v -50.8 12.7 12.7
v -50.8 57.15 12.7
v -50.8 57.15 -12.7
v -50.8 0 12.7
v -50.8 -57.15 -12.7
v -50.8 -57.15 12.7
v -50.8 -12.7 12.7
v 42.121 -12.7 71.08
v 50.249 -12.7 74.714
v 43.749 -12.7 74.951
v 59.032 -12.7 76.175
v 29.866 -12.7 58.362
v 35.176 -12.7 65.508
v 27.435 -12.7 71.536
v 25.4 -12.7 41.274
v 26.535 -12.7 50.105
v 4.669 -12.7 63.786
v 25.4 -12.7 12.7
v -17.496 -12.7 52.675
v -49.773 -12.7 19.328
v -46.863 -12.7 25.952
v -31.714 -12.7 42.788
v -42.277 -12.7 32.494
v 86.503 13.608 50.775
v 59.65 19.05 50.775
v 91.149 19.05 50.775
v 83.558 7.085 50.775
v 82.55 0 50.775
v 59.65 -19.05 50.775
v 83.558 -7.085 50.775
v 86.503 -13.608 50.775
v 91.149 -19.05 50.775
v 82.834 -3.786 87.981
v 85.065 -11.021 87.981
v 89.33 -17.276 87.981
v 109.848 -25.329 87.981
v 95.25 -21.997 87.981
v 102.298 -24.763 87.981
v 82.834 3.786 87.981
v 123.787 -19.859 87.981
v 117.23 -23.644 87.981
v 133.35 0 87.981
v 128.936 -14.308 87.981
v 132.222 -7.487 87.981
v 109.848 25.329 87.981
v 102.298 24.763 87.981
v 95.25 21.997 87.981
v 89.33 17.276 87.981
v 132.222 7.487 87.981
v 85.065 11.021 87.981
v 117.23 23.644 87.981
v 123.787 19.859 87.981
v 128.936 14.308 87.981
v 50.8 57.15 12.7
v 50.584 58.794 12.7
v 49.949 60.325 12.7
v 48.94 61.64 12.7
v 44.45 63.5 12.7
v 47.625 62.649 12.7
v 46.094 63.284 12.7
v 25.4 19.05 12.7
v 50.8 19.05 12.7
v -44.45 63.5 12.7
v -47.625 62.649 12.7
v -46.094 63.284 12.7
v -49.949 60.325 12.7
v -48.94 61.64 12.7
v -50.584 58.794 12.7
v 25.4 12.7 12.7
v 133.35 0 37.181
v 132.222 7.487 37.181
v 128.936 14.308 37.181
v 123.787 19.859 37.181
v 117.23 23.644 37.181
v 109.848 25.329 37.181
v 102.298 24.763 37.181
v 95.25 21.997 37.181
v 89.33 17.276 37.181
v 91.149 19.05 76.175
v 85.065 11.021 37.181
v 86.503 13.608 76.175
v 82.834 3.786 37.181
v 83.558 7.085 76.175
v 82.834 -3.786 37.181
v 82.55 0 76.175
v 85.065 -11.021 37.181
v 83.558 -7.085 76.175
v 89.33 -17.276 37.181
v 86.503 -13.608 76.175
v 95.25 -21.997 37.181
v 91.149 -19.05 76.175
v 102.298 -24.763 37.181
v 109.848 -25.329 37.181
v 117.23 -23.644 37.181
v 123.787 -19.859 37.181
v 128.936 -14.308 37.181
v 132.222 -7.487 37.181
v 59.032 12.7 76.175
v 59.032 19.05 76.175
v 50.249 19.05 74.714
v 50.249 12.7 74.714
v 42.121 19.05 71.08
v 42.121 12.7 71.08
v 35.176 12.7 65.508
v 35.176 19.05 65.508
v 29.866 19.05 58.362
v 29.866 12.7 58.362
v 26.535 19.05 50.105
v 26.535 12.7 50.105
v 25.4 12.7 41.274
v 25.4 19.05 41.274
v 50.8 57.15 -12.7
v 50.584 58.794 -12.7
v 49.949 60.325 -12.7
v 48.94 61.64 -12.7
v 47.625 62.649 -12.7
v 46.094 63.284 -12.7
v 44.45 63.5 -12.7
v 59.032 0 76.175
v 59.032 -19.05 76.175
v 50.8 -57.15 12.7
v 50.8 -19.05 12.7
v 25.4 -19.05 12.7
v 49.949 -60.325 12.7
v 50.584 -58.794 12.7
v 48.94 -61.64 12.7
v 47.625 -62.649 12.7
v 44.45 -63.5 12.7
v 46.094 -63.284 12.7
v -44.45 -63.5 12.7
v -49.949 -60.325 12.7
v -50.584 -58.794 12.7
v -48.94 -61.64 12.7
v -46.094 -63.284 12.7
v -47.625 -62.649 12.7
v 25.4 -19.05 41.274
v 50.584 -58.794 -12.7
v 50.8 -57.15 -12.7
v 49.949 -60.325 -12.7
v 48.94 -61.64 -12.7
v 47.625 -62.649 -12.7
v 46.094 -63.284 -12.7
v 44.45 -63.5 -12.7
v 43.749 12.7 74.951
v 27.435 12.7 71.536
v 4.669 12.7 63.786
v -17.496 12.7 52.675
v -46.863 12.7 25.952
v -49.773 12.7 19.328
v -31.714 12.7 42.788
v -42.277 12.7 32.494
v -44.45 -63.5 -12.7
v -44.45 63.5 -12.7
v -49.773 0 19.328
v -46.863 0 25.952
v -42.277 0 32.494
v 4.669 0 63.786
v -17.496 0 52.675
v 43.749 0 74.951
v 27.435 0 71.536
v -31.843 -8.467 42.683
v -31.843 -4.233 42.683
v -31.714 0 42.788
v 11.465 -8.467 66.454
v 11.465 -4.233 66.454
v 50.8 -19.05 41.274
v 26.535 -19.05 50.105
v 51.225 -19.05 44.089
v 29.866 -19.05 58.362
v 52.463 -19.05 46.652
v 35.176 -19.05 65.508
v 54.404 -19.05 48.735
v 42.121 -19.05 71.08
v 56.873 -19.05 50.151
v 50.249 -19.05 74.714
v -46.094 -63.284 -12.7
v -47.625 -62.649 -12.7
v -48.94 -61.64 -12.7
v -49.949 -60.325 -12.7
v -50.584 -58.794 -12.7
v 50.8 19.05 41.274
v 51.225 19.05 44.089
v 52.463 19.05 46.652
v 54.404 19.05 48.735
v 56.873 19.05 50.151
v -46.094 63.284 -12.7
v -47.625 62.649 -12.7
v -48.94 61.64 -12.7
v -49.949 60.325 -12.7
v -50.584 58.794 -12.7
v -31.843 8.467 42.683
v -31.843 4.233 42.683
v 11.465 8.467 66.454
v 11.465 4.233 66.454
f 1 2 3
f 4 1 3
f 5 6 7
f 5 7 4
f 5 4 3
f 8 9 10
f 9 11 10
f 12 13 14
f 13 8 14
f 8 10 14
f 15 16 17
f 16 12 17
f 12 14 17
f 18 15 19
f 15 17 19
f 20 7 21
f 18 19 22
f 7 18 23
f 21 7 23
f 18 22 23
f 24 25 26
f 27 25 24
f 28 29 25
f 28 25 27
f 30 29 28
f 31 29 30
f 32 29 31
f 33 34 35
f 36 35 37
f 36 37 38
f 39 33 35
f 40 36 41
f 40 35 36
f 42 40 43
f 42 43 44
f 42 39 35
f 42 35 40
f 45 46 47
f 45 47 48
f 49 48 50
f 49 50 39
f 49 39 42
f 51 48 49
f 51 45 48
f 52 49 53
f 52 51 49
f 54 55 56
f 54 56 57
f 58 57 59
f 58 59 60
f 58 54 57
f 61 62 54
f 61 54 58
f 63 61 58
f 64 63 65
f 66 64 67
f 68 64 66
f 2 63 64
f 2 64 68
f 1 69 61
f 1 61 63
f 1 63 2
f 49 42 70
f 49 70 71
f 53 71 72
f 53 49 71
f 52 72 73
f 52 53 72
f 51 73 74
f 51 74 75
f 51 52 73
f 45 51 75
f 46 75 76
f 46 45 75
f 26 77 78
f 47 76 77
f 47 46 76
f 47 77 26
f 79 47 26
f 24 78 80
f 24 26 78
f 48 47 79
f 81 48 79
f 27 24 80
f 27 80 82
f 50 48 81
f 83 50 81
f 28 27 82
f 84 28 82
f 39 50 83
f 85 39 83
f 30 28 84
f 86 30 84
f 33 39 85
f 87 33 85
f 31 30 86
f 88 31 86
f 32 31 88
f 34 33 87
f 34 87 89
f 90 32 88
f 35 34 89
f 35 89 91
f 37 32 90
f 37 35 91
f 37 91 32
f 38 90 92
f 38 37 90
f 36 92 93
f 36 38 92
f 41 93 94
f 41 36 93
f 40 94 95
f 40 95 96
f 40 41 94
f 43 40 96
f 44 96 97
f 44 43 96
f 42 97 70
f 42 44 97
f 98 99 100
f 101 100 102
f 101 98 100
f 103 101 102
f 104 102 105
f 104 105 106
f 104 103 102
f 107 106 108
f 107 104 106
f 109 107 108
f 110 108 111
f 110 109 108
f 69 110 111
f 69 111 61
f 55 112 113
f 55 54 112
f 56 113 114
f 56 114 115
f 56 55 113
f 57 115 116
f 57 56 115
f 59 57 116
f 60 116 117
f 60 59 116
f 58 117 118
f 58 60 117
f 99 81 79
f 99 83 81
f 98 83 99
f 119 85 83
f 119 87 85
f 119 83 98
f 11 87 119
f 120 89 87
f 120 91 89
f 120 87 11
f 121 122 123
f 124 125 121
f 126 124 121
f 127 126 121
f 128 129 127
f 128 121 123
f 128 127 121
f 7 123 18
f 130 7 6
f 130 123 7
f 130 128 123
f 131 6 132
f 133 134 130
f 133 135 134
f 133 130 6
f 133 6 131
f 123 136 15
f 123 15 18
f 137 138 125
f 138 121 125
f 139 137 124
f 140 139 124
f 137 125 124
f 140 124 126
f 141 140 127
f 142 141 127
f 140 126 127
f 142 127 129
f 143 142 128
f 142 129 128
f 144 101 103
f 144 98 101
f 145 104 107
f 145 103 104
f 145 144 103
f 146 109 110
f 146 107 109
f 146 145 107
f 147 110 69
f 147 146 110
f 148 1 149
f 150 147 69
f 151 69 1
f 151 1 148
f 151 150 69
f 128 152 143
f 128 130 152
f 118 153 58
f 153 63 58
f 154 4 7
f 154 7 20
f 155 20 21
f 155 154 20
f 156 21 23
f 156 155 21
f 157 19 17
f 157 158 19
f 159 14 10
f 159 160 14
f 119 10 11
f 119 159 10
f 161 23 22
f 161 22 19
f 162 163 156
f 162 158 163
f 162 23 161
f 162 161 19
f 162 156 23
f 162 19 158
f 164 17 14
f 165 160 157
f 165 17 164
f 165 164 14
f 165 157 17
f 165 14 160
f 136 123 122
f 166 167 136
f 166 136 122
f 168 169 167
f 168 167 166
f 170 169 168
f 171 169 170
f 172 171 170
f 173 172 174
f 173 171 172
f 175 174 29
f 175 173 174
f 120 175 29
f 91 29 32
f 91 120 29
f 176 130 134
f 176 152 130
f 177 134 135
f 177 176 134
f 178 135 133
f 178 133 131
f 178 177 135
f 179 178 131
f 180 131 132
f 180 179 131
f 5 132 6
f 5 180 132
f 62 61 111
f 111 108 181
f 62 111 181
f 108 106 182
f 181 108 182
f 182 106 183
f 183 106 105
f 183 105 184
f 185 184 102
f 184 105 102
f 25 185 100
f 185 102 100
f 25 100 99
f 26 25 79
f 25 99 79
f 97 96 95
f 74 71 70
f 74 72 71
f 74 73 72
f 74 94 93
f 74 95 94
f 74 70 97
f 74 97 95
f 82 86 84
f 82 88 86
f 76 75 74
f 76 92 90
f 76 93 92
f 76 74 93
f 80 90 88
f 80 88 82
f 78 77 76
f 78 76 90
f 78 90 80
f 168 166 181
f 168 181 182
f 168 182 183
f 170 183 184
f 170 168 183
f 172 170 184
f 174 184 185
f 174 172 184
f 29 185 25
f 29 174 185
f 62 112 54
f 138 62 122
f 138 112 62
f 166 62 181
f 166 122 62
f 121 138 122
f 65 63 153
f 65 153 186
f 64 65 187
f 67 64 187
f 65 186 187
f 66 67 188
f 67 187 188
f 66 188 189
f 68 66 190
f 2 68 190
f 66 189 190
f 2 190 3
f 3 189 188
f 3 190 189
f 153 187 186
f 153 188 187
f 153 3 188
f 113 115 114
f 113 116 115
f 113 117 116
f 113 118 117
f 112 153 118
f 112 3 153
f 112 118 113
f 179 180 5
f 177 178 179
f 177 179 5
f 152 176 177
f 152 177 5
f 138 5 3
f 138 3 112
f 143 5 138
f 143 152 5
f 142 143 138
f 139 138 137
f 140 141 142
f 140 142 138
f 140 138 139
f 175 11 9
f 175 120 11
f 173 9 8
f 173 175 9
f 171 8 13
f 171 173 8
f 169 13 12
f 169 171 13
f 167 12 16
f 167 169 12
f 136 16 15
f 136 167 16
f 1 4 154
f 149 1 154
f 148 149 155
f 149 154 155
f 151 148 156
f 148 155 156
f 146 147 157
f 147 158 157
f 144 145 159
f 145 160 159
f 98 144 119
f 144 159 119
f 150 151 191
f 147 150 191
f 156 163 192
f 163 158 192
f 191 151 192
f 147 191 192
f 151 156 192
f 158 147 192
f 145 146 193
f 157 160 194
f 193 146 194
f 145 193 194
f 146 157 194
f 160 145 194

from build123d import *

# Parameters (mm, degrees)
F1_DEPTH = 63.5
F0_W     = 25.4
F0_H     = 25.4
F2_DEPTH = 19.05
F4_DEPTH = 12.7
F5_R     = 6.35


with BuildPart() as f1:
    # F0 (on Front) → F1 (new body, symmetric)
    with BuildSketch(Plane.XZ):
        Polygon((-50.8, 12.7), (-50.8, -12.7), (50.8, -12.7), (50.8, 12.7), (25.4, 12.7), align=None)
    extrude(amount=F1_DEPTH, both=True)

    # F0 (on Front) → F2 (join, symmetric)
    with BuildSketch(Plane.XZ):
        with BuildLine():
            Line((25.4, 12.7), (50.8, 12.7))
            Line((50.8, 12.7), (50.8, 41.2740438906))
            ThreePointArc((50.8, 41.2740438906), (53.3553304038, 47.7662954815), (59.6502531694, 50.7751144469))
            Line((59.6502531694, 50.7751144469), (82.55, 50.7751144469))
            Line((82.55, 50.7751144469), (82.55, 76.1751144469))
            Line((82.55, 76.1751144469), (59.0323674039, 76.1751144469))
            ThreePointArc((59.0323674039, 76.1751144469), (35.1764332574, 65.5084247532), (25.4, 41.2740438906))
            Line((25.4, 41.2740438906), (25.4, 12.7))
        make_face()
        with Locations((95.25, 63.4751144469)):
            Rectangle(F0_W, F0_H)
    extrude(amount=F2_DEPTH, both=True)

    # F0 (on Front) → F3 (revolve)
    with BuildSketch(Plane.XZ):
        Polygon((107.95, 87.98056042), (107.95, 76.1751144469), (107.95, 50.7751144469), (107.95, 37.18056042), (133.35, 37.18056042), (133.35, 87.98056042), align=None)
    revolve(axis=Axis((107.95, 0, 62.58056042), (0, 0, 1)))

    # F0 (on Front) → F4 (join, symmetric)
    with BuildSketch(Plane.XZ):
        with BuildLine():
            add(Edge.make_bspline(
                [(-50.8, 12.7), (-50.7150068879, 43.1761480868), (16.0312987864, 76.0926790535), (59.0323674039, 76.1751144469)],
                knots=[0, 0, 0, 0, 126.8551894232, 126.8551894232, 126.8551894232, 126.8551894232], degree=3))
            Line((-50.8, 12.7), (25.4, 12.7))
            Line((25.4, 12.7), (25.4, 41.2740438906))
            ThreePointArc((25.4, 41.2740438906), (35.1764332574, 65.5084247532), (59.0323674039, 76.1751144469))
        make_face()
    extrude(amount=F4_DEPTH, both=True)

    # F5
    f5_edges = [f1.edges().sort_by_distance(p)[0] for p in [
        (50.8, -63.5, 0),
        (-50.8, -63.5, 0),
        (-50.8, 63.5, 0),
        (50.8, 63.5, 0),
    ]]
    fillet(f5_edges, radius=F5_R)


solid = f1.part
